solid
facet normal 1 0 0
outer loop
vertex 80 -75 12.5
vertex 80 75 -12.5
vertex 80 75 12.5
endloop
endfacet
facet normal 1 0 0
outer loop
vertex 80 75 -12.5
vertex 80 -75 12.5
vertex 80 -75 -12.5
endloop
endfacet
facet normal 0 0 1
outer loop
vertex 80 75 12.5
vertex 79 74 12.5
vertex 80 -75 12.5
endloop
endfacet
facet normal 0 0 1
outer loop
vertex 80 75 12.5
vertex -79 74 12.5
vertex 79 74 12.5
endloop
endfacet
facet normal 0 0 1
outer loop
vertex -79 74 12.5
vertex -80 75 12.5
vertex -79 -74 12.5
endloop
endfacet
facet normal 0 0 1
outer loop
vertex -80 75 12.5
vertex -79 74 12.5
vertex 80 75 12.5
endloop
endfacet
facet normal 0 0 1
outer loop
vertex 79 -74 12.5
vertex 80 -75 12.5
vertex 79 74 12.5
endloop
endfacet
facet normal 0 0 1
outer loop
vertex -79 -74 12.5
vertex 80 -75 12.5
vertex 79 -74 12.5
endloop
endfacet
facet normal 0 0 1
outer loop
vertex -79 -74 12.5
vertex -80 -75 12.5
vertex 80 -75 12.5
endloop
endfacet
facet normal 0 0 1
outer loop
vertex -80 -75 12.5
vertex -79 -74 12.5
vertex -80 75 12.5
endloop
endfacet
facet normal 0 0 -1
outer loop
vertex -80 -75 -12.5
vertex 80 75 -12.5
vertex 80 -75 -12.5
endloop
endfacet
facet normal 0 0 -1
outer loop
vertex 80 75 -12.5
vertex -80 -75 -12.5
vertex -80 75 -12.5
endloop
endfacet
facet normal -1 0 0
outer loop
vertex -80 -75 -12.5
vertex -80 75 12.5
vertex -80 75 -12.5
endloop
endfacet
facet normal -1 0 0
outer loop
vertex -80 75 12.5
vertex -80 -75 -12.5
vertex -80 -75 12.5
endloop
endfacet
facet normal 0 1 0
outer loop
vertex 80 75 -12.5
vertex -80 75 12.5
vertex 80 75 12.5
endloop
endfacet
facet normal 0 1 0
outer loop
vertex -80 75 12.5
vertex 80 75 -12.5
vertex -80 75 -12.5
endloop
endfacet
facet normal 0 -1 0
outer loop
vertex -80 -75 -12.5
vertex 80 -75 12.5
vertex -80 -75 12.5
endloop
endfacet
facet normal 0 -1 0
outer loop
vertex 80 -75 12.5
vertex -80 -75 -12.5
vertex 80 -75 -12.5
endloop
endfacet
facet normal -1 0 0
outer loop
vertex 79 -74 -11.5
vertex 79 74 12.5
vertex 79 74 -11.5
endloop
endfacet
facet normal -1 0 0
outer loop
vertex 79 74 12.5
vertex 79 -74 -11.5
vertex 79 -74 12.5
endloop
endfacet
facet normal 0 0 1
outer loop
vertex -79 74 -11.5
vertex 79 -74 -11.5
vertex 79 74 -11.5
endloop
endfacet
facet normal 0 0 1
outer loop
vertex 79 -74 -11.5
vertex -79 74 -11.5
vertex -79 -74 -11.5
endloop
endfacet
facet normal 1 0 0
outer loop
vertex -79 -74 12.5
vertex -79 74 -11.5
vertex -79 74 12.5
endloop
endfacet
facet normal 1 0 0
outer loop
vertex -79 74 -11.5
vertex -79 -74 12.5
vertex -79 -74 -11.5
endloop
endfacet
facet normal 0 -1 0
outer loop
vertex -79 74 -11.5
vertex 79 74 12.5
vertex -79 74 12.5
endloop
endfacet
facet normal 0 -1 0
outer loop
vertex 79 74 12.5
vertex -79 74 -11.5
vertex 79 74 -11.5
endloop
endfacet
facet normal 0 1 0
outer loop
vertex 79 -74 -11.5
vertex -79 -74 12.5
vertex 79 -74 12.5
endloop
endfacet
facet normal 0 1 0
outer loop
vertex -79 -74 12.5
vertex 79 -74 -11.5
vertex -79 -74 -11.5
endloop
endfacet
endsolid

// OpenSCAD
// ========================================
// a 16 x 15 x 2.5 cm enclosure with 0.1 cm wall thickness
// NeuroCAD canonical IR; dimensions are millimetres
// ========================================
$fn = 48;

difference() {
  cube(size=[160, 150, 25], center=true);
  translate([0, 0, 0.6]) {
    cube(size=[158, 148, 24.2], center=true);
  }
}
